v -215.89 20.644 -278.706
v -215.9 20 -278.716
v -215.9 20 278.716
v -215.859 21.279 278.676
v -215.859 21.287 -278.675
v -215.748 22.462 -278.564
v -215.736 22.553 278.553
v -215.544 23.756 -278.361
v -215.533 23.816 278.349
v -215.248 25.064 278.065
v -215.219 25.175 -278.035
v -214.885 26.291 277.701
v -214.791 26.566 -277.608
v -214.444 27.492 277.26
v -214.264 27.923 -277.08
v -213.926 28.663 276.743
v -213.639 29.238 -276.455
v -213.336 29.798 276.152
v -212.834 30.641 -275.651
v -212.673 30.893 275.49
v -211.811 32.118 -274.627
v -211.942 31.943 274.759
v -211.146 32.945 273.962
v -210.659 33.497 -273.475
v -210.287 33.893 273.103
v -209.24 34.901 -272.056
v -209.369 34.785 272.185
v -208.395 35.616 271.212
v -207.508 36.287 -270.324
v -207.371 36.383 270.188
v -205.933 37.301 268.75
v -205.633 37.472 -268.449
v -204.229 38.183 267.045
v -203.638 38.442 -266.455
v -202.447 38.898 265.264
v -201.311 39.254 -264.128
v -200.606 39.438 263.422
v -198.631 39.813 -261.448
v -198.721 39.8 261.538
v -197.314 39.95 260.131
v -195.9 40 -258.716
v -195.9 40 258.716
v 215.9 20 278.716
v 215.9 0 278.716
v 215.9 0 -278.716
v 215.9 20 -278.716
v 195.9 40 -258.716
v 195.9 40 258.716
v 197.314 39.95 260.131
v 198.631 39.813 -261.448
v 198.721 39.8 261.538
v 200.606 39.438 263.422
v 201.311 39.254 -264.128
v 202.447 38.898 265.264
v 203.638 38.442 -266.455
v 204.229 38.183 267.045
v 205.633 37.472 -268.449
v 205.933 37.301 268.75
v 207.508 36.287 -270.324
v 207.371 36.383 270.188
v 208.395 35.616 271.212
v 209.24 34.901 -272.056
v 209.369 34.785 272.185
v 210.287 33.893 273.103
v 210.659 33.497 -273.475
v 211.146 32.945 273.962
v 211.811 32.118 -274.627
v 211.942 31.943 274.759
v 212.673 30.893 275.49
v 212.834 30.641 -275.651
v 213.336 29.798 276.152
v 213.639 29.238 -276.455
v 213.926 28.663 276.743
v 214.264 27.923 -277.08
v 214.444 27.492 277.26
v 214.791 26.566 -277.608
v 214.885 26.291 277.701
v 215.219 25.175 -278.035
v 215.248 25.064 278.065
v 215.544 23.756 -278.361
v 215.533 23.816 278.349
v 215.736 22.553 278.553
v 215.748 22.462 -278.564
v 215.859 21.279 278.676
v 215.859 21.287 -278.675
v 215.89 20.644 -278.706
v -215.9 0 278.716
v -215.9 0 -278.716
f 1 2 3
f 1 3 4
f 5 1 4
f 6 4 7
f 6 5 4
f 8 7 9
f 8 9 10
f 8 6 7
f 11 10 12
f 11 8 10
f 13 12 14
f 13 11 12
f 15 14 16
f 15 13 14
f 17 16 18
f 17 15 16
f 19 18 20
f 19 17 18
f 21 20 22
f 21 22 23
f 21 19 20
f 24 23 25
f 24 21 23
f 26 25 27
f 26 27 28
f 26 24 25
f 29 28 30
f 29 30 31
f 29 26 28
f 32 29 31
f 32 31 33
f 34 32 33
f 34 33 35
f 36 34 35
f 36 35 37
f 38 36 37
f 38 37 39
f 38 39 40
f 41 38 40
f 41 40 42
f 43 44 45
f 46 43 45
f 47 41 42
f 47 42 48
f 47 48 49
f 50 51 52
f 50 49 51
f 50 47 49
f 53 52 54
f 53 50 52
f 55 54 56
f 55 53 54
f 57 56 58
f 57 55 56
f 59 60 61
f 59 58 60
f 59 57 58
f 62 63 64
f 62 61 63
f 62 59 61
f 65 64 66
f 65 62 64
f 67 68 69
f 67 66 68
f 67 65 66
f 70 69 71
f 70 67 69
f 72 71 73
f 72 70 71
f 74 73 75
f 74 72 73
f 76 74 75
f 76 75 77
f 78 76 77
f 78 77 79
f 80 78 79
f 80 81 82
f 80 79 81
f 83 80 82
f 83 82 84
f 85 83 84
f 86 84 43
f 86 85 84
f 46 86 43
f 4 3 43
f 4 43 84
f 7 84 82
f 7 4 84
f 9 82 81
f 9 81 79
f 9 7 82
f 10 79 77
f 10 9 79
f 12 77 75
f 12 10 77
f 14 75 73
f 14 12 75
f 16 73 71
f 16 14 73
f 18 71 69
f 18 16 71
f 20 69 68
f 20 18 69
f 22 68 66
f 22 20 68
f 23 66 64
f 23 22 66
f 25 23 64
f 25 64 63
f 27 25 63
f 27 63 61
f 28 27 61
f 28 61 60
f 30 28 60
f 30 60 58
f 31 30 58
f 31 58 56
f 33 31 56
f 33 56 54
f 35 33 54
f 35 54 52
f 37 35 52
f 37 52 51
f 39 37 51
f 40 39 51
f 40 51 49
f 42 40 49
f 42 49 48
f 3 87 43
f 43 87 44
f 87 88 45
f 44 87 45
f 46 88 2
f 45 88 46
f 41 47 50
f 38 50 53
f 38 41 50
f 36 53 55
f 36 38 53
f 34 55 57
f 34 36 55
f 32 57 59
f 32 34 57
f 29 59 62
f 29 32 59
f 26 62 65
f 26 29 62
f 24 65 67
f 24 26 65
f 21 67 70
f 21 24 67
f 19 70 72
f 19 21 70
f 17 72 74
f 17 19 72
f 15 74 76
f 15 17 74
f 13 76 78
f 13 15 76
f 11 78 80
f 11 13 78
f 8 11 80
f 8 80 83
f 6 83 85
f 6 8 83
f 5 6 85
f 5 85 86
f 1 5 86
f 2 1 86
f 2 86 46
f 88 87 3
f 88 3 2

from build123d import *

# Parameters (mm, degrees)
SKETCH1_W           = 431.8
SKETCH1_H           = 557.4328891
BOSS_EXTRUDE1_DEPTH = 40
FILLET1_START       = -215.9
FILLET1_DEPTH       = 431.8
FILLET1_START_2     = -280
FILLET1_2_DEPTH     = 560


with BuildPart() as part:
    # Sketch1 → Boss-Extrude1 (new body)
    with BuildSketch(Plane(origin=(0, 0, 0), x_dir=(1, 0, 0), z_dir=(0, 1, 0))):
        Rectangle(SKETCH1_W, SKETCH1_H)
    extrude(amount=BOSS_EXTRUDE1_DEPTH)

    # Fillet1: read off the stored shape, not the designer's step
    # Fillet1 outline → Fillet1 (cut)
    with BuildSketch(Plane.YZ.offset(FILLET1_START)):
        with BuildLine():
            Line((40, -278.71644455), (40, -258.71644455))
            ThreePointArc((40, -258.71644455), (34.142135624, -272.858580174), (20, -278.71644455))
            Line((20, -278.71644455), (40, -278.71644455))
        make_face()
        with BuildLine():
            ThreePointArc((20, 278.71644455), (34.142135624, 272.858580174), (40, 258.71644455))
            Line((40, 258.71644455), (40, 278.71644455))
            Line((40, 278.71644455), (20, 278.71644455))
        make_face()
    extrude(amount=FILLET1_DEPTH, mode=Mode.SUBTRACT)

    # Fillet1 2 outline → Fillet1 2 (cut)
    with BuildSketch(Plane.XY.offset(FILLET1_START_2)):
        with BuildLine():
            Line((215.9, 40), (195.9, 40))
            ThreePointArc((195.9, 40), (210.042135624, 34.142135624), (215.9, 20))
            Line((215.9, 20), (215.9, 40))
        make_face()
        with BuildLine():
            ThreePointArc((-215.9, 20), (-210.042135624, 34.142135624), (-195.9, 40))
            Line((-195.9, 40), (-215.9, 40))
            Line((-215.9, 40), (-215.9, 20))
        make_face()
    extrude(amount=FILLET1_2_DEPTH, mode=Mode.SUBTRACT)


solid = part.part
